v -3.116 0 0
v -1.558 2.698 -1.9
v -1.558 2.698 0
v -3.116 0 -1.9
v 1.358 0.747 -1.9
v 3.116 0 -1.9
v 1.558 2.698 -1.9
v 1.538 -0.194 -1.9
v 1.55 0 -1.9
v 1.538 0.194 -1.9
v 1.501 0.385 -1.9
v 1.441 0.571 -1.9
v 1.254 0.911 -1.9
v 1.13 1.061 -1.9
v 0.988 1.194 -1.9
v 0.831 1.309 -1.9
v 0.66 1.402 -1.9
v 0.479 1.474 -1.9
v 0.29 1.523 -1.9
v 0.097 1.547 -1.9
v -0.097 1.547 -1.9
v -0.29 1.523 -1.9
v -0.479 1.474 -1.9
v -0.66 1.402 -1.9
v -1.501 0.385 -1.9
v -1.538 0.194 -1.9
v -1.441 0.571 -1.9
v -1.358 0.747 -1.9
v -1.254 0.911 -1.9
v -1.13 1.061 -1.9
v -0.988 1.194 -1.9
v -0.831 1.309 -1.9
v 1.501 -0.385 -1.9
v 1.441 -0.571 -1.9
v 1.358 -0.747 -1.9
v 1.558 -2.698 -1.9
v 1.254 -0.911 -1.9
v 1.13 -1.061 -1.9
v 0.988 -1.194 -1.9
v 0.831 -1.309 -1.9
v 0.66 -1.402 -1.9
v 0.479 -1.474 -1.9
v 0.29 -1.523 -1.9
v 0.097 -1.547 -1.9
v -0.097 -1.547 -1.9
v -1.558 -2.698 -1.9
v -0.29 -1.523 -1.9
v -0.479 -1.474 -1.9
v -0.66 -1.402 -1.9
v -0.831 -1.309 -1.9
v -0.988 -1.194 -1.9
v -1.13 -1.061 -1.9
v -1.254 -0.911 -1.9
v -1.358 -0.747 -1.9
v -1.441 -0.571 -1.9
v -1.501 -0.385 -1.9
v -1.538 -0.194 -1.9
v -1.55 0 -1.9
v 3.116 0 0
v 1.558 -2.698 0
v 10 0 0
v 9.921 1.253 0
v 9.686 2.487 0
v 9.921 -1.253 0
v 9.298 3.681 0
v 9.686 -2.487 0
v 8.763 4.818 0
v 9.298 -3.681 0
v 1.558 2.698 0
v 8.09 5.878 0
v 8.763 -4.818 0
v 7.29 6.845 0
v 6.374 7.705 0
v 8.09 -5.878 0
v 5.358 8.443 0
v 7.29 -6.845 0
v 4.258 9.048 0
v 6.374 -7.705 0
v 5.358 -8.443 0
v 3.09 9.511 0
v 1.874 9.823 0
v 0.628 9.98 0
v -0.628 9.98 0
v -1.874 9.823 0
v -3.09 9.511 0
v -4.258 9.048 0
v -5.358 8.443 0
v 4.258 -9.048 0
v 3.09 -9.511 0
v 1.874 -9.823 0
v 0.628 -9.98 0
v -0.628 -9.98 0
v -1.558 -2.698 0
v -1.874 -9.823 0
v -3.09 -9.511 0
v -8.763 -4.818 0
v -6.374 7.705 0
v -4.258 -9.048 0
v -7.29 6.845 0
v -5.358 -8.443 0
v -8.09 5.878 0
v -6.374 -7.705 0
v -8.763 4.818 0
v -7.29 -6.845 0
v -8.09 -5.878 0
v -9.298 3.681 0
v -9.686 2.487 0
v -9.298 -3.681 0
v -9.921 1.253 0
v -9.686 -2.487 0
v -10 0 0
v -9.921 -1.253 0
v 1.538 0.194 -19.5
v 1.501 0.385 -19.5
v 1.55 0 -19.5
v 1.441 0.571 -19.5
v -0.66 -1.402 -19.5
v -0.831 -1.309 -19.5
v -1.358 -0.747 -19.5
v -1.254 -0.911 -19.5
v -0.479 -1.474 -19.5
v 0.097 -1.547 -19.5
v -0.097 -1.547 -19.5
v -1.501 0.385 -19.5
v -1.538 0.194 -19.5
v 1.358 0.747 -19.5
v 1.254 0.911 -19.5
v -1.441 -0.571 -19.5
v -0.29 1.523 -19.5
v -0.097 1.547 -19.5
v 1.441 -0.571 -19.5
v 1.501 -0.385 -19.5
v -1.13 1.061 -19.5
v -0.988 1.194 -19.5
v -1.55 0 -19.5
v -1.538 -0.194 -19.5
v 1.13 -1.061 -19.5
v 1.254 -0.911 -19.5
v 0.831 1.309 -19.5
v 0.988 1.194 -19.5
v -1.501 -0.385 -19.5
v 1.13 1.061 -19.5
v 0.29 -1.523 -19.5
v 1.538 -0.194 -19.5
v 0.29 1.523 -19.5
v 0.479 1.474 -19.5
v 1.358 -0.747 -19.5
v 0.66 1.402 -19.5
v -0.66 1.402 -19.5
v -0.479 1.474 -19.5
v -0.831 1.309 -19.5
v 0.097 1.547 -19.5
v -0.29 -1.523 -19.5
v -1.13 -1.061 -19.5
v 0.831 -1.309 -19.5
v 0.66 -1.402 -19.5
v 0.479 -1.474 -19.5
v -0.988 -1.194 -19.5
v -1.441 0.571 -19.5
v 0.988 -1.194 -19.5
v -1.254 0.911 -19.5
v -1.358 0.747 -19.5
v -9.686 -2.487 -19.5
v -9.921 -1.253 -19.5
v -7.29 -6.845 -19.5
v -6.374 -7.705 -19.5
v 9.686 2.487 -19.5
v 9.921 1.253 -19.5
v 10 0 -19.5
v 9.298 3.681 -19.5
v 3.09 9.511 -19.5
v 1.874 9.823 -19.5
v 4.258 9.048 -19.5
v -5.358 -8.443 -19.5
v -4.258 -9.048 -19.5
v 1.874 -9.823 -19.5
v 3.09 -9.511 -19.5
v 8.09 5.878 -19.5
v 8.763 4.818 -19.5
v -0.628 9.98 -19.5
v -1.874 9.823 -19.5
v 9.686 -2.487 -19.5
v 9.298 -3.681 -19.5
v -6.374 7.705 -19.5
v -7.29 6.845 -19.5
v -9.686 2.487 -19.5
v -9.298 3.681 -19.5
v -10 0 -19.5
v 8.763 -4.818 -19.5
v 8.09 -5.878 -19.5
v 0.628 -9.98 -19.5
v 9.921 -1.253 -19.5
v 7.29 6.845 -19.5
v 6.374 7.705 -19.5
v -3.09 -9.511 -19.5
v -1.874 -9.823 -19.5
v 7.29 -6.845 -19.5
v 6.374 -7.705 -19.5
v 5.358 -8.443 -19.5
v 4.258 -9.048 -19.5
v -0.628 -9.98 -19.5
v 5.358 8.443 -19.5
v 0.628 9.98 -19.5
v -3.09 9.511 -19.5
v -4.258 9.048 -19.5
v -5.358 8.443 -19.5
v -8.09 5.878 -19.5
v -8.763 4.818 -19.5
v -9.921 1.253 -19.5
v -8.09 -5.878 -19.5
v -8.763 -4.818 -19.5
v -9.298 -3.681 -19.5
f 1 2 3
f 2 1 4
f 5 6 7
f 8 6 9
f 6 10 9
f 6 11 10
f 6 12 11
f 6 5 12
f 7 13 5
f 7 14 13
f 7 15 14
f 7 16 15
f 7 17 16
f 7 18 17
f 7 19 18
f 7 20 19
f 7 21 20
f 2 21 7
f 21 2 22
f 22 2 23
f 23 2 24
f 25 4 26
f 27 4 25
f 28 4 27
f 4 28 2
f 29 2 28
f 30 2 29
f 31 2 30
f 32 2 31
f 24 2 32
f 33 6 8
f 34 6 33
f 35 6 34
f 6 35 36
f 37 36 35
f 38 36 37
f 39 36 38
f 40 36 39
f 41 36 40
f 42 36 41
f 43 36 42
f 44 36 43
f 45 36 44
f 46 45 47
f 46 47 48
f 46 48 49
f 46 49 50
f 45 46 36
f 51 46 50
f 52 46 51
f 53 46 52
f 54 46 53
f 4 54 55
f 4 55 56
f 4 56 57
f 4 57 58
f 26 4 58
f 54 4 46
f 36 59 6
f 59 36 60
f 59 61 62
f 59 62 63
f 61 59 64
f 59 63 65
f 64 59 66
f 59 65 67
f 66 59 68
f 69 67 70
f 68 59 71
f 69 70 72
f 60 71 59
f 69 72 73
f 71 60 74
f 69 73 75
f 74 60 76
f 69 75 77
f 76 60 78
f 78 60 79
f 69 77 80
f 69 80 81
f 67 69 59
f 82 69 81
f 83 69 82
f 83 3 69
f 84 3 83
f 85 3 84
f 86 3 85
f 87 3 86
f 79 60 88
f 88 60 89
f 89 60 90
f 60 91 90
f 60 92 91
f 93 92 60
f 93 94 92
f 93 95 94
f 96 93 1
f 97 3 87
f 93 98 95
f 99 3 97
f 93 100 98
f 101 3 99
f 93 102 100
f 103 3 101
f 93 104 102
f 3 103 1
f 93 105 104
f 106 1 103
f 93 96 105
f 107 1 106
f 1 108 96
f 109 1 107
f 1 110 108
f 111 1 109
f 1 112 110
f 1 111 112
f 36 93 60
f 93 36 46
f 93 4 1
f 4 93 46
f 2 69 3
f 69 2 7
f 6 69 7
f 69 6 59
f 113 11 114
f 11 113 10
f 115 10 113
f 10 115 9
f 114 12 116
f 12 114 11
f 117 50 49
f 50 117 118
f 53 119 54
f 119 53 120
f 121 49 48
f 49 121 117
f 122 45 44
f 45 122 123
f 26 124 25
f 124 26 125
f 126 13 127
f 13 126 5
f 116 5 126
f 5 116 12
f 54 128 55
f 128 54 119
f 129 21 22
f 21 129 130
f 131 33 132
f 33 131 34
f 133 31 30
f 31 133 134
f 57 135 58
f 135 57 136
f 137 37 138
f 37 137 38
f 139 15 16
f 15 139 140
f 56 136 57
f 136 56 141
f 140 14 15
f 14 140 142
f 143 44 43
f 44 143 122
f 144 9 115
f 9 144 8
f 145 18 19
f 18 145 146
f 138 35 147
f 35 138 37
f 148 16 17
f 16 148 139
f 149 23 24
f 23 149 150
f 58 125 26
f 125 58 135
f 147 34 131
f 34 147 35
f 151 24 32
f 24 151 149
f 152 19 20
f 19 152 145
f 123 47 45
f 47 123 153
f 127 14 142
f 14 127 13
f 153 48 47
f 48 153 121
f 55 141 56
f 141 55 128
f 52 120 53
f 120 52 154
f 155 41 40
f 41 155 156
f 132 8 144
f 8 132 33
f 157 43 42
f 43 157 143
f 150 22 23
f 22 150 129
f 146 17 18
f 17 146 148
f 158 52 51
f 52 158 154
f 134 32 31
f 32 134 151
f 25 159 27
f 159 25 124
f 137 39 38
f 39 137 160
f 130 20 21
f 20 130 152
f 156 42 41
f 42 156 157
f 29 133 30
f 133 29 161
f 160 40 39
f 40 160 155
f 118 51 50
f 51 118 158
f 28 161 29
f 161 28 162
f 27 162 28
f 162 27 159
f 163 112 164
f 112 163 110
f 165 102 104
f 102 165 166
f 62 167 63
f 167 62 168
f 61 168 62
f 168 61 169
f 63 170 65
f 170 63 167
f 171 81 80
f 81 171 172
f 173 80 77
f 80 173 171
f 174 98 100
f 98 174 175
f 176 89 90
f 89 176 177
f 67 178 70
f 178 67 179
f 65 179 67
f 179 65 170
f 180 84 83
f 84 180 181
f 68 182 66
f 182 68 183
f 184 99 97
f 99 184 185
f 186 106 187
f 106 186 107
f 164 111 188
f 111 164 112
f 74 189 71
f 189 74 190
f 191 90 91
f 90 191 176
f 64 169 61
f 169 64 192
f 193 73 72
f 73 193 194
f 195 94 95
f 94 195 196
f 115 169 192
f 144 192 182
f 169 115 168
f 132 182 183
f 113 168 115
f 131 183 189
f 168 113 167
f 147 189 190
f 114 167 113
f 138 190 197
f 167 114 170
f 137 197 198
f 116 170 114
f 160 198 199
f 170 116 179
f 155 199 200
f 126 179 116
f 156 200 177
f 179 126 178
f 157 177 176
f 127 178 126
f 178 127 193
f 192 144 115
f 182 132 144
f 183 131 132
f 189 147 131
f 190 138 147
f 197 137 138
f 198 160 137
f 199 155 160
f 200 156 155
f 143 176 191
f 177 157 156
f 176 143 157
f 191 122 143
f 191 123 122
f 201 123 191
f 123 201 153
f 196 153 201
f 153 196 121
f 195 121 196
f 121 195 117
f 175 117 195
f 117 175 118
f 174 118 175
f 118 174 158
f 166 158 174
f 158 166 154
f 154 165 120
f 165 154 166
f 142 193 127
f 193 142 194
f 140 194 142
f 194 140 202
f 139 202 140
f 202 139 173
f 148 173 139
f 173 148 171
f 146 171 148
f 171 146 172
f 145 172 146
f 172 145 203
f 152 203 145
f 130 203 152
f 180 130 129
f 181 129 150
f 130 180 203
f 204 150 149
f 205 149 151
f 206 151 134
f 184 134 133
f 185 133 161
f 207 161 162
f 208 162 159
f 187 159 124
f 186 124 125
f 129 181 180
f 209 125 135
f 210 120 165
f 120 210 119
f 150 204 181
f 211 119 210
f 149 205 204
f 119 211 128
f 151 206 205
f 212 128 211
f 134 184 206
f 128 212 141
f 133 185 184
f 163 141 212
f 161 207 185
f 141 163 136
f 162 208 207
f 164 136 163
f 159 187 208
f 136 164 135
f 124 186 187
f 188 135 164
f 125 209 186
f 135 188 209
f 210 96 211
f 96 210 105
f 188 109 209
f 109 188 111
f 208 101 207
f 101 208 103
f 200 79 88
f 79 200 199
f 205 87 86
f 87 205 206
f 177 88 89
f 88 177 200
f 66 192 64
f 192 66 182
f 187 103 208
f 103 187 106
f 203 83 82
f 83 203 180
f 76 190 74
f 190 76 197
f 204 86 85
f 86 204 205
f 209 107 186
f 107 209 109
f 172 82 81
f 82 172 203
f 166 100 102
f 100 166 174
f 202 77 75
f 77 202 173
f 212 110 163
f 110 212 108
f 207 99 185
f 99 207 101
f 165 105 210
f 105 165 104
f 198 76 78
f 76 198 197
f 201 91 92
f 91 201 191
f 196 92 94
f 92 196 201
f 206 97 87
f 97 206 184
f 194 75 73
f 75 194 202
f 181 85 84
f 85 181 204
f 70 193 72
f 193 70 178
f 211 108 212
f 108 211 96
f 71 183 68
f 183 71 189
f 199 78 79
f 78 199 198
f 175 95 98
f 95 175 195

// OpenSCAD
$fn = 50;


difference() {
	union() {
		translate(v = [0, 0, -19.5000000000]) {
			cylinder(h = 19.5000000000, r = 10.0000000000);
		}
	}
	union() {
		translate(v = [0, 0, 0]) {
			rotate(a = [0, 0, 0]) {
				difference() {
					union() {
						translate(v = [0, 0, -1.9000000000]) {
							linear_extrude(height = 1.9000000000) {
								polygon(points = [[3.1158000000, 0.0000000000], [1.5579000000, 2.6983619531], [-1.5579000000, 2.6983619531], [-3.1158000000, 0.0000000000], [-1.5579000000, -2.6983619531], [1.5579000000, -2.6983619531]]);
							}
						}
					}
					union();
				}
			}
		}
		#translate(v = [0, 0, -100.0000000000]) {
			cylinder(h = 200, r = 1.5500000000);
		}
	}
}
